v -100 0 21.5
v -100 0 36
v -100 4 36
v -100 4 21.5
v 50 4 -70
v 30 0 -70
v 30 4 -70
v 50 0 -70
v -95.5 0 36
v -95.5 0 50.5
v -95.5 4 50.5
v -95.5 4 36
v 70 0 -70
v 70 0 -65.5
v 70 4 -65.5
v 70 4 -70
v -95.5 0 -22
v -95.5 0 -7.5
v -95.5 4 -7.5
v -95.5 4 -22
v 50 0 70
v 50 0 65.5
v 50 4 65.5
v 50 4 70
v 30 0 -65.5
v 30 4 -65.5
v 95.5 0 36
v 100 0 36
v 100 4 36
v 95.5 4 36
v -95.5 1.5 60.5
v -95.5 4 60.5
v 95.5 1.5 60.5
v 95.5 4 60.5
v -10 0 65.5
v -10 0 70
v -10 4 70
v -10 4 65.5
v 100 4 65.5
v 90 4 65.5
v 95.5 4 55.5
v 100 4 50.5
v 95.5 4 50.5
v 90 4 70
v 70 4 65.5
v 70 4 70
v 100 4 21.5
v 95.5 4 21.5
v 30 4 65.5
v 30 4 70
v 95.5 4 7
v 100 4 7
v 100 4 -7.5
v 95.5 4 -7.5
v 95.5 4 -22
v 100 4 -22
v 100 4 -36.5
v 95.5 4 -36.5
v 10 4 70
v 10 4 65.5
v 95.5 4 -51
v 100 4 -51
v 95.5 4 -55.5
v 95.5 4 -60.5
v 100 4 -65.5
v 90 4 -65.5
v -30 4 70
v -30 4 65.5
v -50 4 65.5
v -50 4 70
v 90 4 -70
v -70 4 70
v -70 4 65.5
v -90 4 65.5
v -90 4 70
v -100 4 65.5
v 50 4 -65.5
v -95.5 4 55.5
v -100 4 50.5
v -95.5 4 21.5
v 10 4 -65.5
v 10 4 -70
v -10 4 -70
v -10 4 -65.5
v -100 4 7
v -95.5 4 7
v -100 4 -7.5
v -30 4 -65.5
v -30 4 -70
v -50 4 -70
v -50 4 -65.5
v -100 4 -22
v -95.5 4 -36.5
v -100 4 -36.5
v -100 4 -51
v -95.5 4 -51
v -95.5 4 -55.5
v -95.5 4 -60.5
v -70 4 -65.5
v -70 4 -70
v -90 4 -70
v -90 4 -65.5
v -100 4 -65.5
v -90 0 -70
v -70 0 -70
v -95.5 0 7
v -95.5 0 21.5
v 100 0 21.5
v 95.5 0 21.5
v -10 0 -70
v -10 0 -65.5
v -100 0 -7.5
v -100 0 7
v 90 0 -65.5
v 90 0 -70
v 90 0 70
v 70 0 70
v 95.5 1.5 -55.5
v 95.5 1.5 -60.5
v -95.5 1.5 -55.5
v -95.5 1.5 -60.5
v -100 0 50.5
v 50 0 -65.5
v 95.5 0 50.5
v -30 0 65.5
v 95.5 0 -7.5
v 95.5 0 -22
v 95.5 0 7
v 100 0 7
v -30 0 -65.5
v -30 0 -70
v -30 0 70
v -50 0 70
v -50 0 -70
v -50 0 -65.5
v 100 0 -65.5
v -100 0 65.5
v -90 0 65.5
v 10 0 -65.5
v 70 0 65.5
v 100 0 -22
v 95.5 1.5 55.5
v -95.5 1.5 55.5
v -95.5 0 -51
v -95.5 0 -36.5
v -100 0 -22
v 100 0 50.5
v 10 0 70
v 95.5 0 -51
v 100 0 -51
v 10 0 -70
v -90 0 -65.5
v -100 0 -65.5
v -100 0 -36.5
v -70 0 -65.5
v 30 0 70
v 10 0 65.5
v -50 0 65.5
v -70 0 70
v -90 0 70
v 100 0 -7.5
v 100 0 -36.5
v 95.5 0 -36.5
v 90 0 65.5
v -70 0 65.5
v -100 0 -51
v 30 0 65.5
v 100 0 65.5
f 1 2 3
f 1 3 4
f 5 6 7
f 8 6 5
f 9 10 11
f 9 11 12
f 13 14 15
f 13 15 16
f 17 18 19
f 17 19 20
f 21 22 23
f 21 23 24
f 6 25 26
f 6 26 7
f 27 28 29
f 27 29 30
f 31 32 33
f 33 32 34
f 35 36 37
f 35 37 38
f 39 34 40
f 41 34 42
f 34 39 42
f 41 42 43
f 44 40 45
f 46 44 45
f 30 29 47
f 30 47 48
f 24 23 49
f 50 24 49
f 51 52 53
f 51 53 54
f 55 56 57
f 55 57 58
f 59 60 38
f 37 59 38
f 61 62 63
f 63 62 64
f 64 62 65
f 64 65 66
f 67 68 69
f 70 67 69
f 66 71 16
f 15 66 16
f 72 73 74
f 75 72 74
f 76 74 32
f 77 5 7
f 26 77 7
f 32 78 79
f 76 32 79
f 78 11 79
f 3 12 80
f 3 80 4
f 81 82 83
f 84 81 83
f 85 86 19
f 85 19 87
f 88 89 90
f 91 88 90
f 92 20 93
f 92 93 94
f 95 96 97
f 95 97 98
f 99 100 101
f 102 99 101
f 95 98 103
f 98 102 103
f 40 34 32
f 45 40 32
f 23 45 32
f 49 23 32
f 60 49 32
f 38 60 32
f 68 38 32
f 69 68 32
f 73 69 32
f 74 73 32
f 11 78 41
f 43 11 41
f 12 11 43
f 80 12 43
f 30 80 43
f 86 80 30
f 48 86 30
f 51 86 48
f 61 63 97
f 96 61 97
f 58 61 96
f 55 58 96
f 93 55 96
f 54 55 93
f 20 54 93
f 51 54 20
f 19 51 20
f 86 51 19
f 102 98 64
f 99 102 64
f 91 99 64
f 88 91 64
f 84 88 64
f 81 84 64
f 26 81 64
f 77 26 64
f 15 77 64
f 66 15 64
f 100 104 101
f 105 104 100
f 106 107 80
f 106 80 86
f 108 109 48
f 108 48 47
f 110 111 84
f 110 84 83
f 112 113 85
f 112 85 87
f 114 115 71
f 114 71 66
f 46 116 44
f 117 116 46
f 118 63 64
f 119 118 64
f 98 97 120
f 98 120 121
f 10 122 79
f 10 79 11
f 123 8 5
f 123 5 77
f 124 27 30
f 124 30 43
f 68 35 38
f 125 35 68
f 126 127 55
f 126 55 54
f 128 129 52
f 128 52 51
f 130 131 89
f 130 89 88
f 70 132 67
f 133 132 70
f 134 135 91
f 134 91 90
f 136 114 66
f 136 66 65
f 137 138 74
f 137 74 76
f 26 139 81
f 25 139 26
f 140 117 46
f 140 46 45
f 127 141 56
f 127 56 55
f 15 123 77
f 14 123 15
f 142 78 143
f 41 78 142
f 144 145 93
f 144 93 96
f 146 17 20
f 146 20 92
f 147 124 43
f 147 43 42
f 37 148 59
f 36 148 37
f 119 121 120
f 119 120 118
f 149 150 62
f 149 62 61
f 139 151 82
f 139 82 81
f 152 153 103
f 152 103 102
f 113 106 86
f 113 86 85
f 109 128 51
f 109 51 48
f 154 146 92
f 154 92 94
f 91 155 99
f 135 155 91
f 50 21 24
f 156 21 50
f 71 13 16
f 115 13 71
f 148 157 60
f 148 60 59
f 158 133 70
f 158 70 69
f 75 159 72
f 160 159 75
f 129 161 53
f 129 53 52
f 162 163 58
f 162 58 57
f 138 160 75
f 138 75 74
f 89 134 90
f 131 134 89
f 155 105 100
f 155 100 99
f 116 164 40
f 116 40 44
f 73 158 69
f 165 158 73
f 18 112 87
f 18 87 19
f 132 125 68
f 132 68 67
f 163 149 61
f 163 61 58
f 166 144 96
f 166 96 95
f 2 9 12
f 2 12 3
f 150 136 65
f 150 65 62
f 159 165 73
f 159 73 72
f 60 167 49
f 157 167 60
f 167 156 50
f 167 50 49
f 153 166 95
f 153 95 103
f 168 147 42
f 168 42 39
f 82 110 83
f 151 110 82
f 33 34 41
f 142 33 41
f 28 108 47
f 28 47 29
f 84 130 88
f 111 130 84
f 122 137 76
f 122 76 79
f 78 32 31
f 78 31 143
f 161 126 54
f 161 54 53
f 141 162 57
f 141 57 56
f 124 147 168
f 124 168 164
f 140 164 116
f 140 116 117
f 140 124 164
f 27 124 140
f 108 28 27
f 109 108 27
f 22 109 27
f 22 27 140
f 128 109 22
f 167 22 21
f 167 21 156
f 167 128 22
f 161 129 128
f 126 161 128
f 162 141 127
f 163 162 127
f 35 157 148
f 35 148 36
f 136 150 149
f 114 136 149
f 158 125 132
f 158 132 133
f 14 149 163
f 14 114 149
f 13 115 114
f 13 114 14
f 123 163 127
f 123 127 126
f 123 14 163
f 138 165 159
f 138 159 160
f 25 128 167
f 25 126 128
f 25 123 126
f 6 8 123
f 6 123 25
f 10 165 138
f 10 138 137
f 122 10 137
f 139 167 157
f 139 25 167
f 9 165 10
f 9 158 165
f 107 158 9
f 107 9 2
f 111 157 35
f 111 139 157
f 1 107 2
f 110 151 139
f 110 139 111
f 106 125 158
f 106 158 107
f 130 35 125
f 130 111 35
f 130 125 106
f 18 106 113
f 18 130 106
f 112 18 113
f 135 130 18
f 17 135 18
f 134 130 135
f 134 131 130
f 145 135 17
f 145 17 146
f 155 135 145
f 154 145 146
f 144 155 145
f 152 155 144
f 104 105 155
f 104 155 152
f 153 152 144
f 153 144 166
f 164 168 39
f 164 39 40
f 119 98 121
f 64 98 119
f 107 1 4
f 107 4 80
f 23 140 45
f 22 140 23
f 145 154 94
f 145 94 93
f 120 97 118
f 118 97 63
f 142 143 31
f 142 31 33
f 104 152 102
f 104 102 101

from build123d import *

# Parameters (mm, degrees)
BOSS_EXTRUDE1_DEPTH = 4
SKETCH2_W           = 191
SKETCH2_H           = 5
CUT_EXTRUDE1_DEPTH  = 2.5


with BuildPart() as part:
    # Sketch1 → Boss-Extrude1 (new body)
    with BuildSketch(Plane(origin=(0, 0, 0), x_dir=(1, 0, 0), z_dir=(0, 1, 0))):
        Polygon((-70, 70), (-70, 65.5), (-50, 65.5), (-50, 70), (-30, 70), (-30, 65.5), (-10, 65.5), (-10, 70), (10, 70), (10, 65.5), (30, 65.5), (30, 70), (50, 70), (50, 65.5), (70, 65.5), (70, 70), (90, 70), (90, 65.5), (100, 65.5), (100, 51), (95.5, 51), (95.5, 36.5), (100, 36.5), (100, 22), (95.5, 22), (95.5, 7.5), (100, 7.5), (100, -7), (95.5, -7), (95.5, -21.5), (100, -21.5), (100, -36), (95.5, -36), (95.5, -50.5), (100, -50.5), (100, -65.5), (90, -65.5), (90, -70), (70, -70), (70, -65.5), (50, -65.5), (50, -70), (30, -70), (30, -65.5), (10, -65.5), (10, -70), (-10, -70), (-10, -65.5), (-30, -65.5), (-30, -70), (-50, -70), (-50, -65.5), (-70, -65.5), (-70, -70), (-90, -70), (-90, -65.5), (-100, -65.5), (-100, -50.5), (-95.5, -50.5), (-95.5, -36), (-100, -36), (-100, -21.5), (-95.5, -21.5), (-95.5, -7), (-100, -7), (-100, 7.5), (-95.5, 7.5), (-95.5, 22), (-100, 22), (-100, 36.5), (-95.5, 36.5), (-95.5, 51), (-100, 51), (-100, 65.5), (-90, 65.5), (-90, 70), align=None)
    extrude(amount=BOSS_EXTRUDE1_DEPTH)

    # Sketch2 → Cut-Extrude1 (cut)
    with BuildSketch(Plane(origin=(0, 4, 0), x_dir=(1, 0, 0), z_dir=(0, 1, 0))):
        with Locations((0, 58)):
            Rectangle(SKETCH2_W, SKETCH2_H)
        with Locations((0, -58)):
            Rectangle(SKETCH2_W, SKETCH2_H)
    extrude(amount=-CUT_EXTRUDE1_DEPTH, mode=Mode.SUBTRACT)


solid = part.part
